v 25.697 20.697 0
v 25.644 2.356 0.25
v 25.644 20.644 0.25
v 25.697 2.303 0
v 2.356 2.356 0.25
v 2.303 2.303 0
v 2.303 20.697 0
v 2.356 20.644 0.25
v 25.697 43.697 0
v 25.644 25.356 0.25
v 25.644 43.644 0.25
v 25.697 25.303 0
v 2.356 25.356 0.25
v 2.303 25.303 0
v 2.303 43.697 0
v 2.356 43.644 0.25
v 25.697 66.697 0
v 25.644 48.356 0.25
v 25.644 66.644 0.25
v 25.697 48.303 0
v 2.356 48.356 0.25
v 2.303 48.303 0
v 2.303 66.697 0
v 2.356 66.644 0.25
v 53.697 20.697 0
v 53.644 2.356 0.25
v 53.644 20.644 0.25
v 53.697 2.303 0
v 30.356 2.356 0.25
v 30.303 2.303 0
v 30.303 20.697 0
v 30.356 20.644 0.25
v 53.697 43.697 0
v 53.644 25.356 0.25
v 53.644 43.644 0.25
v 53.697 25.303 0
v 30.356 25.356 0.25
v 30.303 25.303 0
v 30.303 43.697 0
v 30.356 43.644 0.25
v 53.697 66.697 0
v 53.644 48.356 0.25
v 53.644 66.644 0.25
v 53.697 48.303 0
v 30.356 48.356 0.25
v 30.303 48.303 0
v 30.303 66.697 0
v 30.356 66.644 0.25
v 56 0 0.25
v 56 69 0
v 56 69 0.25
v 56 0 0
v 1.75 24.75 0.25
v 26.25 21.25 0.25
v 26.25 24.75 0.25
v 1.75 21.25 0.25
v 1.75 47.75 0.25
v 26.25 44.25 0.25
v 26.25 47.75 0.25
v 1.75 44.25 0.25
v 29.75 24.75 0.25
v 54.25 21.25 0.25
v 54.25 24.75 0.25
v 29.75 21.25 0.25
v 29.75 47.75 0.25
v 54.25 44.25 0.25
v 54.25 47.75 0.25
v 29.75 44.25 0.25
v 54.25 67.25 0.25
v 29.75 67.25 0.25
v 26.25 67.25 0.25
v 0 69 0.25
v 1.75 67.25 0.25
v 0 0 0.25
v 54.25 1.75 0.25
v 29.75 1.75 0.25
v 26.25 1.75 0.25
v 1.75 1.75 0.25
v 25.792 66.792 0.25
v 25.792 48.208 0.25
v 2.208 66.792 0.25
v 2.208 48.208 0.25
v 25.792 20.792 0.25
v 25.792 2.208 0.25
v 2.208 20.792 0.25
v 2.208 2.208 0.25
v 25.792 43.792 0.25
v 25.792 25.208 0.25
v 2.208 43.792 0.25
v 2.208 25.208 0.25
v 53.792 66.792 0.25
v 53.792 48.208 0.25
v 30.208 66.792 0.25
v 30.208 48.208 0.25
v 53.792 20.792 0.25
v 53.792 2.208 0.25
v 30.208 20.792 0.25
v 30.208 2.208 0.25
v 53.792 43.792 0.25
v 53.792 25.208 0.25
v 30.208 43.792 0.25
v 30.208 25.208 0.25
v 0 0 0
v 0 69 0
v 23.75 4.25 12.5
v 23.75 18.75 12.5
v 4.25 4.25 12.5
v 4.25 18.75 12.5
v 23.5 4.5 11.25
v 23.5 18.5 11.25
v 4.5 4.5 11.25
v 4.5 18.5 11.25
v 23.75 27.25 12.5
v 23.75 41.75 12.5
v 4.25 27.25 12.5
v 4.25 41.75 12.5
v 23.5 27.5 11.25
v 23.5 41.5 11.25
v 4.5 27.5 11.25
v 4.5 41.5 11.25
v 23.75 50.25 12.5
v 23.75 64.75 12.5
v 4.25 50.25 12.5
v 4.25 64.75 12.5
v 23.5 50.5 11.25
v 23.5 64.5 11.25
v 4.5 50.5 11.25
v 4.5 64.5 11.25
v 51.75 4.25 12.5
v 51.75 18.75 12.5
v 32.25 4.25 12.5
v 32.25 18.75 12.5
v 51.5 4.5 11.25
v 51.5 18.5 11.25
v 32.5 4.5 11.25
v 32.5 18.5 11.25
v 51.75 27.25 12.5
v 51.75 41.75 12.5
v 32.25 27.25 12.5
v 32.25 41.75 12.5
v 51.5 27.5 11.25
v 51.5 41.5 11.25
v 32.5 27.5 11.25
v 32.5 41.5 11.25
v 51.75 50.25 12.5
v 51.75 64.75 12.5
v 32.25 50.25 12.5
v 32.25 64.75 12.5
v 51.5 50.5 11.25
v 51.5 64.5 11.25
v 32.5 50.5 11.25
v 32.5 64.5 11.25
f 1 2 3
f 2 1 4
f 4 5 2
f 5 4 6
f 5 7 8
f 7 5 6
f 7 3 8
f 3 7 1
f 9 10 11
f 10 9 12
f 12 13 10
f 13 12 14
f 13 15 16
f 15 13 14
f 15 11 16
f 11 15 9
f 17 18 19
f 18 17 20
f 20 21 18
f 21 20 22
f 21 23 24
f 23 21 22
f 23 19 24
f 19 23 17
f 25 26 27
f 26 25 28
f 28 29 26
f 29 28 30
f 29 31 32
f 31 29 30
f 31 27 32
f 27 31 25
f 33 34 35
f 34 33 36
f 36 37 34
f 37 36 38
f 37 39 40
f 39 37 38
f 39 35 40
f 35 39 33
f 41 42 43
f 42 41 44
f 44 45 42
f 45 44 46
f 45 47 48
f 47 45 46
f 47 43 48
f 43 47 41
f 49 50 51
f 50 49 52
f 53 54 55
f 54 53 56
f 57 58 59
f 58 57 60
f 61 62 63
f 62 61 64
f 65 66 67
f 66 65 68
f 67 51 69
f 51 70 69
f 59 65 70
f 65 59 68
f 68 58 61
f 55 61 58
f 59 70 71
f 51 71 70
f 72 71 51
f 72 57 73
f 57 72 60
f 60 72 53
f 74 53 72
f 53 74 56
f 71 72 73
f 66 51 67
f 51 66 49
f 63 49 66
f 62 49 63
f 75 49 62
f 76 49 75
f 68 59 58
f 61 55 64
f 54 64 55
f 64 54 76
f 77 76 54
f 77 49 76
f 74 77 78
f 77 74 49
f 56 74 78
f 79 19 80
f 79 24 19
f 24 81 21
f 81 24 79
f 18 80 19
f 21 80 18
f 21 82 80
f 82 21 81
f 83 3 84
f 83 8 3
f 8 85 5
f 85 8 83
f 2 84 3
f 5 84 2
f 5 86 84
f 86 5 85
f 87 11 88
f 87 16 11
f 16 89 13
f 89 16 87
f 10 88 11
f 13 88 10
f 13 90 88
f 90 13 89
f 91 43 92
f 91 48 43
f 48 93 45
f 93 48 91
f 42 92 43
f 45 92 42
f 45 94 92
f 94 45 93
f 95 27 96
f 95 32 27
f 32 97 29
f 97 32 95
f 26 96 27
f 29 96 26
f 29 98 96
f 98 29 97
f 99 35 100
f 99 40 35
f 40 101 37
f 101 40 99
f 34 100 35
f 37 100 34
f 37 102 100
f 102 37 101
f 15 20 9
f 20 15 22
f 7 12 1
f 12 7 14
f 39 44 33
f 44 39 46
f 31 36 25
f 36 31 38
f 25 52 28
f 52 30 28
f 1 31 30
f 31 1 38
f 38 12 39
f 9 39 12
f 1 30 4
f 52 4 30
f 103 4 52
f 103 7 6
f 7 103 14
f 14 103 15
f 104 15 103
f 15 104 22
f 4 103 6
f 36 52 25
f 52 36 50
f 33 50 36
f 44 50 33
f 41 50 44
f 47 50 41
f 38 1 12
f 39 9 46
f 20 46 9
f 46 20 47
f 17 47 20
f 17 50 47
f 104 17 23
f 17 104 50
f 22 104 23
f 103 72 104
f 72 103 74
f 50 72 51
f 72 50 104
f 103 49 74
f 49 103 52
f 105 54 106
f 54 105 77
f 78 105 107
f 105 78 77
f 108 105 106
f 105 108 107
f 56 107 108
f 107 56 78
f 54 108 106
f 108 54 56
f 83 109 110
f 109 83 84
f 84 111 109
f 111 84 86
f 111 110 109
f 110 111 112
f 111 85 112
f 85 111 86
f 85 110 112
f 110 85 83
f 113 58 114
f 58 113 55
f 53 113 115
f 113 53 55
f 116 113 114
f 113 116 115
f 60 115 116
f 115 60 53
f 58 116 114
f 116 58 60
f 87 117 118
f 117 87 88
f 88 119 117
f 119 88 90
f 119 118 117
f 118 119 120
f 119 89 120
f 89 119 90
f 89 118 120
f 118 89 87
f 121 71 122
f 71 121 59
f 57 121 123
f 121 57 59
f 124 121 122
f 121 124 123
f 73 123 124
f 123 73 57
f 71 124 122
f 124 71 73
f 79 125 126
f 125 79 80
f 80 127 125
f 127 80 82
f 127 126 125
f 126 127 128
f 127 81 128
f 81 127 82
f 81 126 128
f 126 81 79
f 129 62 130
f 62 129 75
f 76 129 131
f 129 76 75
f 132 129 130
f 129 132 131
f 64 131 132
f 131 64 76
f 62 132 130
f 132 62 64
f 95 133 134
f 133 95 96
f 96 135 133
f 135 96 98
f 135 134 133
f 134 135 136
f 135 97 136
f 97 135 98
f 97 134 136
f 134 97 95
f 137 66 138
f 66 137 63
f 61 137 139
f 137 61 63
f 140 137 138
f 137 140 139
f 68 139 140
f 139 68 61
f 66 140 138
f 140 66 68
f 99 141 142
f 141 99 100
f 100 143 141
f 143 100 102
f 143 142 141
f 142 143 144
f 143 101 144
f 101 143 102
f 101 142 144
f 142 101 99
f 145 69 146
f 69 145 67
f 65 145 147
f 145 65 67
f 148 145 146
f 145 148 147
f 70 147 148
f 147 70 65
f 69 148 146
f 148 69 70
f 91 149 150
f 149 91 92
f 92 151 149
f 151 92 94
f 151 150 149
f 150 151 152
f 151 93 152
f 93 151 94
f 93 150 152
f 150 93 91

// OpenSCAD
//num of ice places in x
numx = 2;
//num of ice places in x
numy = 3;

//dist in x between ice things
dx = 4;

//dist in y between ice things
dy = 4;

//ice thing width
itw = 20;

//ice thing height
ith = 15;

//ice thing base width
itbw = 15;

//ice thing base height
itbh = 10;

//ice thing depth
itd = 10;

//tray top thickness
ttth = 3;

//thickness
th = 2;

module ice_thing(padding=0)
{
  translate([th,th,0])
  polyhedron(points=[ [-padding,-padding,0],[itw+padding,-padding,0],[itw+padding,ith+padding,0], [-padding,ith+padding,0],

							[(itw-itbw)/2-padding,(ith-itbh)/2-padding,itd+padding],[itbw+(itw-itbw)/2+padding,(ith-itbh)/2-padding,itd+padding],[itbw+(itw-itbw)/2+padding,itbh+(ith-itbh)/2+padding,itd+padding],[(itw-itbw)/2-padding,itbh+(ith-itbh)/2+padding,itd+padding]],
				faces=[ [0,1,2,3], [4,5,1,0], [5,6,2,1], [7,4,0,3], [6,7,3,2], [7,6,5,4]  ]);
  
}

module top(padding)
{
  difference()
  {
  cube([numx*(itw+th*2+dx), numy*(ith+th*2+dy),.25]);
translate([0,0,-.25])
  translate([dx/2,dy/2,0])
for( i=[0:numx-1])
  {
    for( j=[0:numy-1])
    {
      translate([i*(itw+th*2+dx), j*(ith+th*2+dy),0])
      {
        difference()
        {
        ice_thing(padding-.25);
        }
      }
    }
  }

  }

}

module ice_tray(padding=0)
{


  top(padding);
  translate([dx/2,dy/2,.25])
  
  for( i=[0:numx-1])
  {
    for( j=[0:numy-1])
    {
      translate([i*(itw+th*2+dx), j*(ith+th*2+dy),0])
      {
        difference()
        {
        ice_thing(padding+.25);
        translate([0,0,-1])
        color([1,0,0,1])
        ice_thing(padding);
        }
      }
    }
  }
  
}

//ice_tray();
color([1,0,1,1])
ice_tray(padding=th);



//ice_thing();
//color([1,1,1,.5])
//ice_thing(padding=th);
